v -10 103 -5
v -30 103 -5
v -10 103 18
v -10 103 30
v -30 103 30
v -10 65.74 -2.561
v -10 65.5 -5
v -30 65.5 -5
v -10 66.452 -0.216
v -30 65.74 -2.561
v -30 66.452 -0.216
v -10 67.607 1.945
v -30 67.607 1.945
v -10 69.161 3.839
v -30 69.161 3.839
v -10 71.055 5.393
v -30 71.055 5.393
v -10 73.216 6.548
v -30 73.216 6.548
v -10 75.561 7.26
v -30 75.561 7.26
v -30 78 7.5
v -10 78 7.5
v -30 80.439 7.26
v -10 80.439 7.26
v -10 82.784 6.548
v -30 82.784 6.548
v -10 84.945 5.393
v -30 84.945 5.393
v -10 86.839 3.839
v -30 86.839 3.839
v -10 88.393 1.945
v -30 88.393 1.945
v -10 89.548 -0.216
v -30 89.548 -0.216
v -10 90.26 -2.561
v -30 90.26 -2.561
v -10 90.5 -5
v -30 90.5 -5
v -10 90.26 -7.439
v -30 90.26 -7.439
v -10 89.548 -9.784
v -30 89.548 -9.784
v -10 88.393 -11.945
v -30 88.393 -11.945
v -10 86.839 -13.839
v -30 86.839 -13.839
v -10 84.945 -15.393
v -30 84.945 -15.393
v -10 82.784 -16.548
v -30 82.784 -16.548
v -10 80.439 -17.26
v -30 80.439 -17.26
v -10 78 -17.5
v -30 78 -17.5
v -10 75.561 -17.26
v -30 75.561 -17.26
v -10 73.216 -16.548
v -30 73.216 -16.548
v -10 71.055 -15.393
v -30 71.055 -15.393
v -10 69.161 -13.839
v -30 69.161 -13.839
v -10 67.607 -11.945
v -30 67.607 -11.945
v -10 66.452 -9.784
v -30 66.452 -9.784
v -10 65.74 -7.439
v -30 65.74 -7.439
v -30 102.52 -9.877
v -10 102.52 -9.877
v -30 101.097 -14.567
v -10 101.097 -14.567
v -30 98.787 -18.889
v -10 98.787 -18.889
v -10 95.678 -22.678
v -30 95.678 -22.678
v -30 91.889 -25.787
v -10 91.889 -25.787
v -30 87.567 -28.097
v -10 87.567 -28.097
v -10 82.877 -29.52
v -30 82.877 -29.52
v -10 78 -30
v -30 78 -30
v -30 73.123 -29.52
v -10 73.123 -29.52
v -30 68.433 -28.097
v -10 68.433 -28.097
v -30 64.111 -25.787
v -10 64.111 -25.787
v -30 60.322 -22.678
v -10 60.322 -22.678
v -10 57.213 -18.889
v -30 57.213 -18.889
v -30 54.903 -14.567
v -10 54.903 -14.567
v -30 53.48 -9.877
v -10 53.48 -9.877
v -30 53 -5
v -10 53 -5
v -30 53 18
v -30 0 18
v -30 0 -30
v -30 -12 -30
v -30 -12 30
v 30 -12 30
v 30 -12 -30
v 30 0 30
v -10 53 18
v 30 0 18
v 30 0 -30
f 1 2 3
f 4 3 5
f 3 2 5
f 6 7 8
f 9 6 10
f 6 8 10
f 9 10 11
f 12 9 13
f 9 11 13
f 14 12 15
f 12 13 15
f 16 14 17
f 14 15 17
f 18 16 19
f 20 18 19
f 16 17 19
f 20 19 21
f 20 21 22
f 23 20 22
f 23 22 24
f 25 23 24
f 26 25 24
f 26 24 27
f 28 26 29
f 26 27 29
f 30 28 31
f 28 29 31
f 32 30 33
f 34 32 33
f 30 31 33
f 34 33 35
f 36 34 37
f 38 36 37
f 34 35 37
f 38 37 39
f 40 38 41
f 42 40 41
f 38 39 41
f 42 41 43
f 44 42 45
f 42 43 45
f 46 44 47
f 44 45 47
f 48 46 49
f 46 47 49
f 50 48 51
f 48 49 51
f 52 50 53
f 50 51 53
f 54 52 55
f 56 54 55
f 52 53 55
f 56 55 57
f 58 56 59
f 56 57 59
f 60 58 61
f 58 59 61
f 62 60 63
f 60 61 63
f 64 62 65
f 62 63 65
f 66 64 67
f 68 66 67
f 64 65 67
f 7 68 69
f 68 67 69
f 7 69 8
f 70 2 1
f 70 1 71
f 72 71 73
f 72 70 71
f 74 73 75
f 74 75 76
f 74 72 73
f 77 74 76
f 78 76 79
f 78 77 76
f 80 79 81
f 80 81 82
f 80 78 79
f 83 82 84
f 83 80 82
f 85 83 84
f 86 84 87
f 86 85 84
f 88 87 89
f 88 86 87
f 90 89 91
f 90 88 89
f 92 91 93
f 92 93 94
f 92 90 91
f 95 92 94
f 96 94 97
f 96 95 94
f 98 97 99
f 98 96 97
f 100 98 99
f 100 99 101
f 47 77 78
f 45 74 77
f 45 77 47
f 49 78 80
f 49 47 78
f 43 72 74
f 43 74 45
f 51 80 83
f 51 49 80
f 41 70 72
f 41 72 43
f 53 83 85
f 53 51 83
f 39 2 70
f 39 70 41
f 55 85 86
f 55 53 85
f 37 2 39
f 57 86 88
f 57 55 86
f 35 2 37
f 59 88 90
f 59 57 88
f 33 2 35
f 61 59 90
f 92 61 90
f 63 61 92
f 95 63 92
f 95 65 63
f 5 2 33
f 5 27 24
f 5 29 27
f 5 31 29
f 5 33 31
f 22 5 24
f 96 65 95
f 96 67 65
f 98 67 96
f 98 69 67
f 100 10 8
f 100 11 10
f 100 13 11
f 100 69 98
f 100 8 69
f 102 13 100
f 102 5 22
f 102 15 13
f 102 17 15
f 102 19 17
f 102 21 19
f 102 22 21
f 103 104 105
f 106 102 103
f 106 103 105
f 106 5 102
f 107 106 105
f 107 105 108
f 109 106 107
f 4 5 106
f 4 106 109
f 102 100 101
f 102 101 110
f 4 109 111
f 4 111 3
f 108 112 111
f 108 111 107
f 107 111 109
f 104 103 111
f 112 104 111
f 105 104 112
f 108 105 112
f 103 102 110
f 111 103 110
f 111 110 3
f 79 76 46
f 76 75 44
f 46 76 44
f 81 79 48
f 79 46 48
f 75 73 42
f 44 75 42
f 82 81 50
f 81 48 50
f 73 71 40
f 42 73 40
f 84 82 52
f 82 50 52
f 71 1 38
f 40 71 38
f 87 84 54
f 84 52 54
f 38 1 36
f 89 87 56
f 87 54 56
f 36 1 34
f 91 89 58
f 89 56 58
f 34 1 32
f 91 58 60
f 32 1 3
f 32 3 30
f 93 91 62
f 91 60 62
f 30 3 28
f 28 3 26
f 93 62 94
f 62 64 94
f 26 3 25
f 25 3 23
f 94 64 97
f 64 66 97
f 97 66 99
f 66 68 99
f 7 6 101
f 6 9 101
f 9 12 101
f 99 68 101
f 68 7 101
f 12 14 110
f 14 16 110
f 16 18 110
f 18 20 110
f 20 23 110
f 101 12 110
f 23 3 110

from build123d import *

# Parameters (mm, degrees)
F0_W     = 60
F0_H     = 60
F1_DEPTH = 12
F3_DEPTH = 12
F4_W     = 50
F4_H     = 23
F5_DEPTH = 20
F7_DEPTH = 20
F8_R     = 12.5
F9_DEPTH = 20


with BuildPart() as f1:
    # F0 (on Front) → F1 (new body)
    with BuildSketch(Plane.XZ):
        Rectangle(F0_W, F0_H)
    extrude(amount=F1_DEPTH)

    # F2 (on face) → F3 (join)
    with BuildSketch(Plane.XY.offset(30)):
        Polygon((-30, 103), (-30, 0), (30, 0), (-10, 103), align=None)
    extrude(amount=-F3_DEPTH)

    # F4 (on face) → F5 (join)
    with BuildSketch(Plane(origin=(-30, 0, 0), x_dir=(0, -1, 0), z_dir=(-1, 0, 0))):
        with Locations((-78, 6.5)):
            Rectangle(F4_W, F4_H)
    extrude(amount=-F5_DEPTH)

    # F6 (on face) → F7 (join)
    with BuildSketch(Plane(origin=(-30, 0, 0), x_dir=(0, -1, 0), z_dir=(-1, 0, 0))):
        with BuildLine():
            Line((-53, -5), (-103, -5))
            ThreePointArc((-103, -5), (-78, -30), (-53, -5))
        make_face()
    extrude(amount=-F7_DEPTH)

    # F8 (on face) → F9 (cut)
    with BuildSketch(Plane(origin=(-30, 0, 0), x_dir=(0, -1, 0), z_dir=(-1, 0, 0))):
        with Locations((-78, -5)):
            Circle(F8_R)
    extrude(amount=-F9_DEPTH, mode=Mode.SUBTRACT)


solid = f1.part
